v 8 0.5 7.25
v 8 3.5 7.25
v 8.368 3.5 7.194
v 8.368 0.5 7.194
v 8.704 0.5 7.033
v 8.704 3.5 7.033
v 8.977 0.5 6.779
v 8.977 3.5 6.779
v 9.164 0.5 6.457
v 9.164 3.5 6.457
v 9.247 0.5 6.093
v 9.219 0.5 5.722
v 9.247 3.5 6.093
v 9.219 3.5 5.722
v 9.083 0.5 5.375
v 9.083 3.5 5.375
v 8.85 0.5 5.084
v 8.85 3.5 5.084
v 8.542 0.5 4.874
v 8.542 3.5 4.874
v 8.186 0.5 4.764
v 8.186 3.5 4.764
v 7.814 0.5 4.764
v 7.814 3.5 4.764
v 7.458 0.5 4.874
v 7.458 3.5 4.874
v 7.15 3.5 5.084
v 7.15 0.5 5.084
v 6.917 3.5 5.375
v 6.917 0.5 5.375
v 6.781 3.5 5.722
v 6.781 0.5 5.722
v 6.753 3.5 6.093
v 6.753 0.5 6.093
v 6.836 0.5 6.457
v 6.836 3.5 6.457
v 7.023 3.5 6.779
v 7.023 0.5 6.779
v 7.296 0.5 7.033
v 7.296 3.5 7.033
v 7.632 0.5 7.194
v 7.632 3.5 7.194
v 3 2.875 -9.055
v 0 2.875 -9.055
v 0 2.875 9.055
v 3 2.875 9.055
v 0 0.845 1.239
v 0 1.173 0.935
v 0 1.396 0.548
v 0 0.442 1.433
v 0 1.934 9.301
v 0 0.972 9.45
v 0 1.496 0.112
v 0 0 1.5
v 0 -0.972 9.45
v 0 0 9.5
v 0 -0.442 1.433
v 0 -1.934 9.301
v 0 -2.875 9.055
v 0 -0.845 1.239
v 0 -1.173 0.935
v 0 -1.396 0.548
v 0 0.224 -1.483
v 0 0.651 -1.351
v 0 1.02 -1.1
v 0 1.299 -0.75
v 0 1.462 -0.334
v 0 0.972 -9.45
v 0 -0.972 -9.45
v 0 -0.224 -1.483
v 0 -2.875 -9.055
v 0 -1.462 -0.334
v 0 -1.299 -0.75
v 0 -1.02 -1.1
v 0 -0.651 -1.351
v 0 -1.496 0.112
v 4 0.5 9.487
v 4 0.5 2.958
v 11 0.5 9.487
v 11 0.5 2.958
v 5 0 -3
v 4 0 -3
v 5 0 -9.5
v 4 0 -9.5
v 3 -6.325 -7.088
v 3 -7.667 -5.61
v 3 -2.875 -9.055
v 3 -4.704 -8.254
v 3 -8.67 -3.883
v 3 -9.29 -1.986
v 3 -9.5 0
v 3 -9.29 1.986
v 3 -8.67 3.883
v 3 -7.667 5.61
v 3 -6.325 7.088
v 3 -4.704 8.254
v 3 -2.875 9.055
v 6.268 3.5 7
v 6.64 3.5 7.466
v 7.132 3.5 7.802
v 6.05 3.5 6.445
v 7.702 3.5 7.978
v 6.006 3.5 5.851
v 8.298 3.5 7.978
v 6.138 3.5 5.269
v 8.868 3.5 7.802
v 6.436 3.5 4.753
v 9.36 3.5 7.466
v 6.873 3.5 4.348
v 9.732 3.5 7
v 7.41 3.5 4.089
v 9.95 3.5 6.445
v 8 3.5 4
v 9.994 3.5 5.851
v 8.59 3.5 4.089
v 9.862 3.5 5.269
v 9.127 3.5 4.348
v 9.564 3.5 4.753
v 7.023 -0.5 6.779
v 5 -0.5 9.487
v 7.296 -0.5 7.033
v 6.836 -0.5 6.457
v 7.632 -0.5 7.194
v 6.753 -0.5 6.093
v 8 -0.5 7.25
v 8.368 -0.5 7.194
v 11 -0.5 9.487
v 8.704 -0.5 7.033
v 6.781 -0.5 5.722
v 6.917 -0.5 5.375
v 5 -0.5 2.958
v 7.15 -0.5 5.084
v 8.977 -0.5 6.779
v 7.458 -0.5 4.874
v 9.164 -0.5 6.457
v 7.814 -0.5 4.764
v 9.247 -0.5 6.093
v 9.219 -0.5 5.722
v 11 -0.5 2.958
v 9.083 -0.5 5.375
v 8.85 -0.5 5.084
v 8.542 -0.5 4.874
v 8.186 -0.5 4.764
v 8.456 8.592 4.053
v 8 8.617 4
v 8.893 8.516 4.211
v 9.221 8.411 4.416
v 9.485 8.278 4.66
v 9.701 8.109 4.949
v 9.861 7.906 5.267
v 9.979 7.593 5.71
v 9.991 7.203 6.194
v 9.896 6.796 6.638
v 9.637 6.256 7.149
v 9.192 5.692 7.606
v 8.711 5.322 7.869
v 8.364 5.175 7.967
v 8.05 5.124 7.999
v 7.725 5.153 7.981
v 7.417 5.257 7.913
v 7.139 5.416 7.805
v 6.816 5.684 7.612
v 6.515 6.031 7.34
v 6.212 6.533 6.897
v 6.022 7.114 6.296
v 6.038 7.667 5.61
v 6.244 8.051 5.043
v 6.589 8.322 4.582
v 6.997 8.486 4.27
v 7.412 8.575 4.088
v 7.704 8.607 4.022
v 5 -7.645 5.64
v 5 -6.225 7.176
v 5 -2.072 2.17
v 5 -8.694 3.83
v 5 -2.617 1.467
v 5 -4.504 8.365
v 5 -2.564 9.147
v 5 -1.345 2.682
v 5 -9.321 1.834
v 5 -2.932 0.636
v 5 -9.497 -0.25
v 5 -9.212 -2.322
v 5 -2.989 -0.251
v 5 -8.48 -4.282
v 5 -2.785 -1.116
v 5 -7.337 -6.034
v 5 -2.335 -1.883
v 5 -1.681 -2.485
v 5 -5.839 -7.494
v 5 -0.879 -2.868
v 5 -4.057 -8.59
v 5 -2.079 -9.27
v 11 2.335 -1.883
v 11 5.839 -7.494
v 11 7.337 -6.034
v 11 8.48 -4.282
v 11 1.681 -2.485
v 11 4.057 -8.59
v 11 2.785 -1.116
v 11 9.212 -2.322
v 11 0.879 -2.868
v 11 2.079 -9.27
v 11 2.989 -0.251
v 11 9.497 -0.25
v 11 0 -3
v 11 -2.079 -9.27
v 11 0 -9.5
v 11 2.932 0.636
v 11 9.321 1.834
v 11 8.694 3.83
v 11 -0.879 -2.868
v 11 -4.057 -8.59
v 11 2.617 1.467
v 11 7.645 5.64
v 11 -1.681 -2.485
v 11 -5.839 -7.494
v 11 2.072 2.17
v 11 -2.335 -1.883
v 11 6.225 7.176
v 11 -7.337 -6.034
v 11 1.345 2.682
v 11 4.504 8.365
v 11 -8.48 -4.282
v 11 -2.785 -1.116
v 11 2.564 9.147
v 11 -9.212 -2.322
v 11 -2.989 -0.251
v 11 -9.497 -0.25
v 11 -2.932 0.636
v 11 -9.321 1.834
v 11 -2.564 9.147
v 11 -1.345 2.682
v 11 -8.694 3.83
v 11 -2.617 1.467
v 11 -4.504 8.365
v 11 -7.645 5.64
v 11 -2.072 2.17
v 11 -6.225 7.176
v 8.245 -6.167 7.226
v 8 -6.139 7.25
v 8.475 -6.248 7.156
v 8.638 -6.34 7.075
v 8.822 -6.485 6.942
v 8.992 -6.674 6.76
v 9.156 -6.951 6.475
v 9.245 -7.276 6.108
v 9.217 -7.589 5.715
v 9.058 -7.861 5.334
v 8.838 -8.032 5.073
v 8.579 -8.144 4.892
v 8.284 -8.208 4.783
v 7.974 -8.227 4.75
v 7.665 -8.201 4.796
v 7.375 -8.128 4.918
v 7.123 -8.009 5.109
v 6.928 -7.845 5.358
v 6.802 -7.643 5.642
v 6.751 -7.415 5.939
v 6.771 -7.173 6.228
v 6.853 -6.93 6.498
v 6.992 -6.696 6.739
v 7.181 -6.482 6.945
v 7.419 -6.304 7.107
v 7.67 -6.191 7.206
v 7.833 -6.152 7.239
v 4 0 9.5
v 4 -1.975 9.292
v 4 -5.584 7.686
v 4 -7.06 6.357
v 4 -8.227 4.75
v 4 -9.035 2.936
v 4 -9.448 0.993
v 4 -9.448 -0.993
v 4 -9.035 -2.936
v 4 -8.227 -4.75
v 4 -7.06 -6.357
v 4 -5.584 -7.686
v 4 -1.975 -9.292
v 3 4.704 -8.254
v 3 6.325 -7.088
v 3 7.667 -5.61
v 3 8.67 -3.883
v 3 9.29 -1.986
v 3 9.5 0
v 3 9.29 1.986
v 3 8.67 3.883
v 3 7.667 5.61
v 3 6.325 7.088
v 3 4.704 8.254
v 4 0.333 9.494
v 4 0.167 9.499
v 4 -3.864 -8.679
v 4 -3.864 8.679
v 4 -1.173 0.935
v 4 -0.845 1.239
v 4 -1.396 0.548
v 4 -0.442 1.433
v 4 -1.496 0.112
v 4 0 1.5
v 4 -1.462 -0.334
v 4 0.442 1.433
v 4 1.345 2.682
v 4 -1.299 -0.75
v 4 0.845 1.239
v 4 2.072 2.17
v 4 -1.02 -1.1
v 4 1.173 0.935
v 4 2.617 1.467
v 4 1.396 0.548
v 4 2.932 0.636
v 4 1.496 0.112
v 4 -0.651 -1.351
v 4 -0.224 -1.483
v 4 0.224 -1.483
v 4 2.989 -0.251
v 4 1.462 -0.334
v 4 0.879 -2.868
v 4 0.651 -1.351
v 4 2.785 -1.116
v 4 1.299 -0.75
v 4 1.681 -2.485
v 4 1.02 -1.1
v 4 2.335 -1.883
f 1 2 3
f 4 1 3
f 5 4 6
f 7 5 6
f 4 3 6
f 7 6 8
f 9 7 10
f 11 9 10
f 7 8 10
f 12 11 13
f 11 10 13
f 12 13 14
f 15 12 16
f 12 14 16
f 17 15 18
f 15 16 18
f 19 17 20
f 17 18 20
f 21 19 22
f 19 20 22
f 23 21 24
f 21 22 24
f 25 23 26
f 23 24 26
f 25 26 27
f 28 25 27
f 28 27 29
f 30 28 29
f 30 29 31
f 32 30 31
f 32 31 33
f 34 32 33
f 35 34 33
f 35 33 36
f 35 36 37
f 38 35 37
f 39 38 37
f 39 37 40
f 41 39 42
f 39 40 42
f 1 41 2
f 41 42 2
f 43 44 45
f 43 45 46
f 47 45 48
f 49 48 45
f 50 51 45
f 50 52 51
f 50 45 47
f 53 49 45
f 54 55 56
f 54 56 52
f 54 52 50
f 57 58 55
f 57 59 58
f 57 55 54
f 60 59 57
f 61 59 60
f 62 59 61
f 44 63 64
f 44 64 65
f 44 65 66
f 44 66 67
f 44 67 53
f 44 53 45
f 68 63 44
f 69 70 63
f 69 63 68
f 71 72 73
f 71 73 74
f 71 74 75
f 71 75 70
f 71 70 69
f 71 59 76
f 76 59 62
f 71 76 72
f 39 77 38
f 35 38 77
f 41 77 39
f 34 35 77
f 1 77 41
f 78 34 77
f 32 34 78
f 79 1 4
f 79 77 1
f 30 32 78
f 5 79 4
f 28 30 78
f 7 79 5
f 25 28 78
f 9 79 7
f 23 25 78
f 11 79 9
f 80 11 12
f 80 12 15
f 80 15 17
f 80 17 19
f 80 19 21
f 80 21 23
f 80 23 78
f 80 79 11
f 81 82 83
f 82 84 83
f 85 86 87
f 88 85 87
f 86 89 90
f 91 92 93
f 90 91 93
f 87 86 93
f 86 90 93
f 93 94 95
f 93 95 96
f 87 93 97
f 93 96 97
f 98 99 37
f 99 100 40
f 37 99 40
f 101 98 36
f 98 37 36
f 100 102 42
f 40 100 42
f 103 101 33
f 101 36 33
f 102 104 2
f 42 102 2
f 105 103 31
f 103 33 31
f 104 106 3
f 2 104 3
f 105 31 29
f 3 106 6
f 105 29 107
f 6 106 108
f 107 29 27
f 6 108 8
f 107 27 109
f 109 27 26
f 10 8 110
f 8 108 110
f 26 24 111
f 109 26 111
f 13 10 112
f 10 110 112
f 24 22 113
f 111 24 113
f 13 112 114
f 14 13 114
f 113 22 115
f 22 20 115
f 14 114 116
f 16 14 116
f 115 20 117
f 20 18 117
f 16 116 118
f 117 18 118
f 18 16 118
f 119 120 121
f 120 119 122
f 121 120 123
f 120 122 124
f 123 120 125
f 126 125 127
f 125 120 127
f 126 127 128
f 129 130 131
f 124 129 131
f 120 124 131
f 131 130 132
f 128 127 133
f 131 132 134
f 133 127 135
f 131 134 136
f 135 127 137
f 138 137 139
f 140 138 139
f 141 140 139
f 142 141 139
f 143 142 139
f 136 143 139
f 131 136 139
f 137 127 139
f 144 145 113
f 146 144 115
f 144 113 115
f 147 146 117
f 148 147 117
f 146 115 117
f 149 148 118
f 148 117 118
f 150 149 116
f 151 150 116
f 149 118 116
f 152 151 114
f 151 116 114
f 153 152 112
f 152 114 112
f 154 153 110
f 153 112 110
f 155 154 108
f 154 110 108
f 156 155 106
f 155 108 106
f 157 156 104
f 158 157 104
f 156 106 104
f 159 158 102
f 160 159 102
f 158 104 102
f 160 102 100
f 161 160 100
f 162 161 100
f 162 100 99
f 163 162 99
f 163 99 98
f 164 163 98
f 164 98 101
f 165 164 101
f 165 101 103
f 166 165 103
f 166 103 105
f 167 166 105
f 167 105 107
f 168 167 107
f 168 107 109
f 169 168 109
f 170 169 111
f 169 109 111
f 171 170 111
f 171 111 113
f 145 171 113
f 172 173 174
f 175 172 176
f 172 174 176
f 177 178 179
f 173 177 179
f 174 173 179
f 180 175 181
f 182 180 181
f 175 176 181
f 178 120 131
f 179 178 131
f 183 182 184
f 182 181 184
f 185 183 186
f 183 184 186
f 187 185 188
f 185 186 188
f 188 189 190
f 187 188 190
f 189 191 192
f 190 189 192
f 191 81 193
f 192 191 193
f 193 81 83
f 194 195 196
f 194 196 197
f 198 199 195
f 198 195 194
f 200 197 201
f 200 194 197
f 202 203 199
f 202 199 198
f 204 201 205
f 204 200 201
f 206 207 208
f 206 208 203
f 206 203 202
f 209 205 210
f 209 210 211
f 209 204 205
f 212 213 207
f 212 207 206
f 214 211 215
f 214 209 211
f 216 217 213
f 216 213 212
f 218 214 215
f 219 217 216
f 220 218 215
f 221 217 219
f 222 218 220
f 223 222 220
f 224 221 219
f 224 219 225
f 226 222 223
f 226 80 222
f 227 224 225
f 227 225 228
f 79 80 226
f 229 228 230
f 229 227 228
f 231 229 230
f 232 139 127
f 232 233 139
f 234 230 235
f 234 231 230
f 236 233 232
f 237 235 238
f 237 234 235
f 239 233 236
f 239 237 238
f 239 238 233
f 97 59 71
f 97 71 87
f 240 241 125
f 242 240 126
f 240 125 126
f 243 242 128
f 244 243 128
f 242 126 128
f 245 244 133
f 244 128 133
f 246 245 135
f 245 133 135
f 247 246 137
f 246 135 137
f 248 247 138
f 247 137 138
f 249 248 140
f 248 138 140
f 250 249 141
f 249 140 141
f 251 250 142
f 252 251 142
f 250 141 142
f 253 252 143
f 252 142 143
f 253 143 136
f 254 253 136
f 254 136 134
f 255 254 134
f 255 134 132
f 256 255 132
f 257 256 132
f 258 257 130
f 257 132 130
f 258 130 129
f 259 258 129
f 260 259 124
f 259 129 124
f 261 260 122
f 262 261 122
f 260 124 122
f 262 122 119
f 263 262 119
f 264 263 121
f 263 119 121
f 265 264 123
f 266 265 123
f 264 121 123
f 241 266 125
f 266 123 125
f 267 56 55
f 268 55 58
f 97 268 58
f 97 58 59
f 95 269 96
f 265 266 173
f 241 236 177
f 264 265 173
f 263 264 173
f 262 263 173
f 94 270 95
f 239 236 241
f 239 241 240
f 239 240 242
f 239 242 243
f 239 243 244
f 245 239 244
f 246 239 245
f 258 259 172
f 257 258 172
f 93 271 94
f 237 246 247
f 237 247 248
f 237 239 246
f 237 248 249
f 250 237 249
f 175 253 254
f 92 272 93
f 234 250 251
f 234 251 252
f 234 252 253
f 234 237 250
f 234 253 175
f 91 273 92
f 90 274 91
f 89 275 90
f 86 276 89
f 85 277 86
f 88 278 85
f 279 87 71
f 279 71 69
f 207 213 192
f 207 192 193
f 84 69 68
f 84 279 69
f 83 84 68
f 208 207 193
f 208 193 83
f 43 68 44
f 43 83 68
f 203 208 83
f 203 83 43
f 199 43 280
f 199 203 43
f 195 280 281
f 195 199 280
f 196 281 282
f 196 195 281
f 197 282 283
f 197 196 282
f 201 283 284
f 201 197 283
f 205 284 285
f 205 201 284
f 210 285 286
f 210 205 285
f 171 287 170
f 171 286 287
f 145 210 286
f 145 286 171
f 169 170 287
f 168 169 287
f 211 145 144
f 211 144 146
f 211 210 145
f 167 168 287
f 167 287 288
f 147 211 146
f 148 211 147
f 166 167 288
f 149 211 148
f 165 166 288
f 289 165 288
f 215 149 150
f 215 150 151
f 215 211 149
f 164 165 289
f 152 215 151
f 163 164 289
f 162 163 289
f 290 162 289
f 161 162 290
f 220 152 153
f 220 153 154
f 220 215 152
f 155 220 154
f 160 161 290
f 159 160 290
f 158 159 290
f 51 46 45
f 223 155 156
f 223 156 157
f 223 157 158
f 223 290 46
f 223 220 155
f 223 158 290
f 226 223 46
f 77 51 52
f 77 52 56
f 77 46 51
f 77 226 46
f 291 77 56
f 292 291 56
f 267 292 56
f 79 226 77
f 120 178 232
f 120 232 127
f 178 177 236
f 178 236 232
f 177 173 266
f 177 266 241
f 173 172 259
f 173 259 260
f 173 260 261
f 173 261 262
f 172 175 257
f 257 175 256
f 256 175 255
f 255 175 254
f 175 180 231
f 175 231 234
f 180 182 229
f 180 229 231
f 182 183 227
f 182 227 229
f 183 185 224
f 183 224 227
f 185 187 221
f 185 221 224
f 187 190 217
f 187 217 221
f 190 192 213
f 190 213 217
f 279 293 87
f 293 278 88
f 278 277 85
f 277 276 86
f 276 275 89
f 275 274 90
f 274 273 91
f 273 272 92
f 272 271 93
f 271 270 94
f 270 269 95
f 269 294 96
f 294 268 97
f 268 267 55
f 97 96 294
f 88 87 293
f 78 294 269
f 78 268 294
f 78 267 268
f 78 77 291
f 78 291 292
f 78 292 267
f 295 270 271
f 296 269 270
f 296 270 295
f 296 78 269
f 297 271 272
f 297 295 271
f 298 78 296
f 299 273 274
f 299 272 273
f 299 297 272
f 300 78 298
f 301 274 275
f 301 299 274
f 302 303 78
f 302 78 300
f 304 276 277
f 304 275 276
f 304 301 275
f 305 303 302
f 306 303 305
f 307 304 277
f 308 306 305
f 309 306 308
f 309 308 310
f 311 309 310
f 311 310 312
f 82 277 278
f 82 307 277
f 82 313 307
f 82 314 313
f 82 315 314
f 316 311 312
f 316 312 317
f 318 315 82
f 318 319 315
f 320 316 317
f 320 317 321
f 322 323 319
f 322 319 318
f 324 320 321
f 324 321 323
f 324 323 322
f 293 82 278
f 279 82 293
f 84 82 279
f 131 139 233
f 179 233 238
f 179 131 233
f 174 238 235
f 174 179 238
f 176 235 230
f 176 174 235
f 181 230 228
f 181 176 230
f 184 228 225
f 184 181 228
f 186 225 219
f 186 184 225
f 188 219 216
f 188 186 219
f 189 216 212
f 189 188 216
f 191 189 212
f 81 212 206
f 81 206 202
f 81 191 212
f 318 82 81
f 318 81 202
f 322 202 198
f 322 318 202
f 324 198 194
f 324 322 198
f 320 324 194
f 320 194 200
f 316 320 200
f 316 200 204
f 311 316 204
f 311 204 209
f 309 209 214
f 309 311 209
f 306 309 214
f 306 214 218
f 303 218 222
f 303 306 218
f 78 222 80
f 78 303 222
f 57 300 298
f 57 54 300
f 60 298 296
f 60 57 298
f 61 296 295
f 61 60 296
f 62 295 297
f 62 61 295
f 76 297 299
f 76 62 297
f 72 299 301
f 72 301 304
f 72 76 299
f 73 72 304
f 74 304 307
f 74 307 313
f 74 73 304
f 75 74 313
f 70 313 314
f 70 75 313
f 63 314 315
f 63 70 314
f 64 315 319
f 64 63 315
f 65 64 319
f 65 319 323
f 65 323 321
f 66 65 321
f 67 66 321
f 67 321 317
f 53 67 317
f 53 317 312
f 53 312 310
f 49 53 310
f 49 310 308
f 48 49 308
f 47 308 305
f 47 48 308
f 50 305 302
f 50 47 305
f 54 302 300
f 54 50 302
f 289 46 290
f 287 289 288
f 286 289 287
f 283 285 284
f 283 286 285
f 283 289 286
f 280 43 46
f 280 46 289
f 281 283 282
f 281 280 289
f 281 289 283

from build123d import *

# Parameters (mm, degrees)
ESQUISSE2_W                  = 3
ESQUISSE2_H                  = 6.625
ENL_V_MAT_EXTRU_1_DEPTH      = 10
ESQUISSE3_W                  = 1
ESQUISSE3_H                  = 19
ENL_V_MAT_EXTRU_2_DEPTH      = 18.363755354
ESQUISSE4_W                  = 9.5
ESQUISSE4_H                  = 1
ENL_V_MAT_EXTRU_3_DEPTH      = 7
ESQUISSE5_R                  = 1.25
ENL_V_MAT_EXTRU_4_DEPTH      = 10
ENL_V_MAT_EXTRU_6_REACH      = 21.5
ENL_V_MAT_EXTRU_6_END_RADIUS = 9.5
ESQUISSE7_R                  = 2


with BuildPart() as part:
    # Esquisse1 → Base-Révolution (revolve)
    with BuildSketch(Plane.XY, mode=Mode.PRIVATE) as base_r_volution_sk:
        Polygon((0, 1.5), (0, 9.5), (11, 9.5), (11, 3), (4, 3), (4, 1.5), align=None)
    revolve(base_r_volution_sk.sketch.rotate(Axis((0, 0, 0), (1, 0, 0)), 90), axis=Axis((0, 0, 0), (1, 0, 0)))

    # Esquisse2 → Enlèv. mat.-Extru.1 (cut, symmetric)
    with BuildSketch(Plane.XY):
        with Locations((1.5, 6.1875)):
            Rectangle(ESQUISSE2_W, ESQUISSE2_H)
        with Locations((1.5, -6.1875)):
            Rectangle(ESQUISSE2_W, ESQUISSE2_H)
    extrude(amount=ENL_V_MAT_EXTRU_1_DEPTH, both=True, mode=Mode.SUBTRACT)

    # Esquisse3 → Enlèv. mat.-Extru.2 (cut, through all)
    with BuildSketch(Plane(origin=(0, 0, 0), x_dir=(1, 0, 0), z_dir=(0, 1, 0))):
        with Locations((4.5, 0)):
            Rectangle(ESQUISSE3_W, ESQUISSE3_H)
    extrude(amount=-ENL_V_MAT_EXTRU_2_DEPTH, mode=Mode.SUBTRACT)

    # Esquisse4 → Enlèv. mat.-Extru.3 (cut)
    with BuildSketch(Plane(origin=(11, 0, 0), x_dir=(0, 0, -1), z_dir=(1, 0, 0))):
        with Locations((-4.75, 0)):
            Rectangle(ESQUISSE4_W, ESQUISSE4_H)
    extrude(amount=-ENL_V_MAT_EXTRU_3_DEPTH, mode=Mode.SUBTRACT)

    # Esquisse5 → Enlèv. mat.-Extru.4 (cut, symmetric)
    with BuildSketch(Plane(origin=(0, 0, 0), x_dir=(1, 0, 0), z_dir=(0, 1, 0))):
        with Locations(Location((8, -6, 0), (0, 0, 270))):
            Circle(ESQUISSE5_R)
    extrude(amount=ENL_V_MAT_EXTRU_4_DEPTH, both=True, mode=Mode.SUBTRACT)

    # Enlèv. mat.-Extru.6: up to this cylinder (the profile starts inside it)
    enl_v_mat_extru_6_end = Plane(origin=(8, 0, 0), z_dir=(-1, 0, 0)) * Cylinder(ENL_V_MAT_EXTRU_6_END_RADIUS, 63, mode=Mode.PRIVATE)
    # Esquisse7 → Enlèv. mat.-Extru.6 (cut, up to the surface)
    with BuildSketch(Plane.XZ.offset(-3.5), mode=Mode.PRIVATE) as enl_v_mat_extru_6_sk1:
        with Locations(Location((8, 6, 0), (0, 0, 270))):
            Circle(ESQUISSE7_R)
    enl_v_mat_extru_6_tool1 = extrude(enl_v_mat_extru_6_sk1.sketch, amount=-ENL_V_MAT_EXTRU_6_REACH, mode=Mode.PRIVATE) & enl_v_mat_extru_6_end
    add(enl_v_mat_extru_6_tool1.solids().sort_by_distance((8, 3.5, 6))[0], mode=Mode.SUBTRACT)


solid = part.part
